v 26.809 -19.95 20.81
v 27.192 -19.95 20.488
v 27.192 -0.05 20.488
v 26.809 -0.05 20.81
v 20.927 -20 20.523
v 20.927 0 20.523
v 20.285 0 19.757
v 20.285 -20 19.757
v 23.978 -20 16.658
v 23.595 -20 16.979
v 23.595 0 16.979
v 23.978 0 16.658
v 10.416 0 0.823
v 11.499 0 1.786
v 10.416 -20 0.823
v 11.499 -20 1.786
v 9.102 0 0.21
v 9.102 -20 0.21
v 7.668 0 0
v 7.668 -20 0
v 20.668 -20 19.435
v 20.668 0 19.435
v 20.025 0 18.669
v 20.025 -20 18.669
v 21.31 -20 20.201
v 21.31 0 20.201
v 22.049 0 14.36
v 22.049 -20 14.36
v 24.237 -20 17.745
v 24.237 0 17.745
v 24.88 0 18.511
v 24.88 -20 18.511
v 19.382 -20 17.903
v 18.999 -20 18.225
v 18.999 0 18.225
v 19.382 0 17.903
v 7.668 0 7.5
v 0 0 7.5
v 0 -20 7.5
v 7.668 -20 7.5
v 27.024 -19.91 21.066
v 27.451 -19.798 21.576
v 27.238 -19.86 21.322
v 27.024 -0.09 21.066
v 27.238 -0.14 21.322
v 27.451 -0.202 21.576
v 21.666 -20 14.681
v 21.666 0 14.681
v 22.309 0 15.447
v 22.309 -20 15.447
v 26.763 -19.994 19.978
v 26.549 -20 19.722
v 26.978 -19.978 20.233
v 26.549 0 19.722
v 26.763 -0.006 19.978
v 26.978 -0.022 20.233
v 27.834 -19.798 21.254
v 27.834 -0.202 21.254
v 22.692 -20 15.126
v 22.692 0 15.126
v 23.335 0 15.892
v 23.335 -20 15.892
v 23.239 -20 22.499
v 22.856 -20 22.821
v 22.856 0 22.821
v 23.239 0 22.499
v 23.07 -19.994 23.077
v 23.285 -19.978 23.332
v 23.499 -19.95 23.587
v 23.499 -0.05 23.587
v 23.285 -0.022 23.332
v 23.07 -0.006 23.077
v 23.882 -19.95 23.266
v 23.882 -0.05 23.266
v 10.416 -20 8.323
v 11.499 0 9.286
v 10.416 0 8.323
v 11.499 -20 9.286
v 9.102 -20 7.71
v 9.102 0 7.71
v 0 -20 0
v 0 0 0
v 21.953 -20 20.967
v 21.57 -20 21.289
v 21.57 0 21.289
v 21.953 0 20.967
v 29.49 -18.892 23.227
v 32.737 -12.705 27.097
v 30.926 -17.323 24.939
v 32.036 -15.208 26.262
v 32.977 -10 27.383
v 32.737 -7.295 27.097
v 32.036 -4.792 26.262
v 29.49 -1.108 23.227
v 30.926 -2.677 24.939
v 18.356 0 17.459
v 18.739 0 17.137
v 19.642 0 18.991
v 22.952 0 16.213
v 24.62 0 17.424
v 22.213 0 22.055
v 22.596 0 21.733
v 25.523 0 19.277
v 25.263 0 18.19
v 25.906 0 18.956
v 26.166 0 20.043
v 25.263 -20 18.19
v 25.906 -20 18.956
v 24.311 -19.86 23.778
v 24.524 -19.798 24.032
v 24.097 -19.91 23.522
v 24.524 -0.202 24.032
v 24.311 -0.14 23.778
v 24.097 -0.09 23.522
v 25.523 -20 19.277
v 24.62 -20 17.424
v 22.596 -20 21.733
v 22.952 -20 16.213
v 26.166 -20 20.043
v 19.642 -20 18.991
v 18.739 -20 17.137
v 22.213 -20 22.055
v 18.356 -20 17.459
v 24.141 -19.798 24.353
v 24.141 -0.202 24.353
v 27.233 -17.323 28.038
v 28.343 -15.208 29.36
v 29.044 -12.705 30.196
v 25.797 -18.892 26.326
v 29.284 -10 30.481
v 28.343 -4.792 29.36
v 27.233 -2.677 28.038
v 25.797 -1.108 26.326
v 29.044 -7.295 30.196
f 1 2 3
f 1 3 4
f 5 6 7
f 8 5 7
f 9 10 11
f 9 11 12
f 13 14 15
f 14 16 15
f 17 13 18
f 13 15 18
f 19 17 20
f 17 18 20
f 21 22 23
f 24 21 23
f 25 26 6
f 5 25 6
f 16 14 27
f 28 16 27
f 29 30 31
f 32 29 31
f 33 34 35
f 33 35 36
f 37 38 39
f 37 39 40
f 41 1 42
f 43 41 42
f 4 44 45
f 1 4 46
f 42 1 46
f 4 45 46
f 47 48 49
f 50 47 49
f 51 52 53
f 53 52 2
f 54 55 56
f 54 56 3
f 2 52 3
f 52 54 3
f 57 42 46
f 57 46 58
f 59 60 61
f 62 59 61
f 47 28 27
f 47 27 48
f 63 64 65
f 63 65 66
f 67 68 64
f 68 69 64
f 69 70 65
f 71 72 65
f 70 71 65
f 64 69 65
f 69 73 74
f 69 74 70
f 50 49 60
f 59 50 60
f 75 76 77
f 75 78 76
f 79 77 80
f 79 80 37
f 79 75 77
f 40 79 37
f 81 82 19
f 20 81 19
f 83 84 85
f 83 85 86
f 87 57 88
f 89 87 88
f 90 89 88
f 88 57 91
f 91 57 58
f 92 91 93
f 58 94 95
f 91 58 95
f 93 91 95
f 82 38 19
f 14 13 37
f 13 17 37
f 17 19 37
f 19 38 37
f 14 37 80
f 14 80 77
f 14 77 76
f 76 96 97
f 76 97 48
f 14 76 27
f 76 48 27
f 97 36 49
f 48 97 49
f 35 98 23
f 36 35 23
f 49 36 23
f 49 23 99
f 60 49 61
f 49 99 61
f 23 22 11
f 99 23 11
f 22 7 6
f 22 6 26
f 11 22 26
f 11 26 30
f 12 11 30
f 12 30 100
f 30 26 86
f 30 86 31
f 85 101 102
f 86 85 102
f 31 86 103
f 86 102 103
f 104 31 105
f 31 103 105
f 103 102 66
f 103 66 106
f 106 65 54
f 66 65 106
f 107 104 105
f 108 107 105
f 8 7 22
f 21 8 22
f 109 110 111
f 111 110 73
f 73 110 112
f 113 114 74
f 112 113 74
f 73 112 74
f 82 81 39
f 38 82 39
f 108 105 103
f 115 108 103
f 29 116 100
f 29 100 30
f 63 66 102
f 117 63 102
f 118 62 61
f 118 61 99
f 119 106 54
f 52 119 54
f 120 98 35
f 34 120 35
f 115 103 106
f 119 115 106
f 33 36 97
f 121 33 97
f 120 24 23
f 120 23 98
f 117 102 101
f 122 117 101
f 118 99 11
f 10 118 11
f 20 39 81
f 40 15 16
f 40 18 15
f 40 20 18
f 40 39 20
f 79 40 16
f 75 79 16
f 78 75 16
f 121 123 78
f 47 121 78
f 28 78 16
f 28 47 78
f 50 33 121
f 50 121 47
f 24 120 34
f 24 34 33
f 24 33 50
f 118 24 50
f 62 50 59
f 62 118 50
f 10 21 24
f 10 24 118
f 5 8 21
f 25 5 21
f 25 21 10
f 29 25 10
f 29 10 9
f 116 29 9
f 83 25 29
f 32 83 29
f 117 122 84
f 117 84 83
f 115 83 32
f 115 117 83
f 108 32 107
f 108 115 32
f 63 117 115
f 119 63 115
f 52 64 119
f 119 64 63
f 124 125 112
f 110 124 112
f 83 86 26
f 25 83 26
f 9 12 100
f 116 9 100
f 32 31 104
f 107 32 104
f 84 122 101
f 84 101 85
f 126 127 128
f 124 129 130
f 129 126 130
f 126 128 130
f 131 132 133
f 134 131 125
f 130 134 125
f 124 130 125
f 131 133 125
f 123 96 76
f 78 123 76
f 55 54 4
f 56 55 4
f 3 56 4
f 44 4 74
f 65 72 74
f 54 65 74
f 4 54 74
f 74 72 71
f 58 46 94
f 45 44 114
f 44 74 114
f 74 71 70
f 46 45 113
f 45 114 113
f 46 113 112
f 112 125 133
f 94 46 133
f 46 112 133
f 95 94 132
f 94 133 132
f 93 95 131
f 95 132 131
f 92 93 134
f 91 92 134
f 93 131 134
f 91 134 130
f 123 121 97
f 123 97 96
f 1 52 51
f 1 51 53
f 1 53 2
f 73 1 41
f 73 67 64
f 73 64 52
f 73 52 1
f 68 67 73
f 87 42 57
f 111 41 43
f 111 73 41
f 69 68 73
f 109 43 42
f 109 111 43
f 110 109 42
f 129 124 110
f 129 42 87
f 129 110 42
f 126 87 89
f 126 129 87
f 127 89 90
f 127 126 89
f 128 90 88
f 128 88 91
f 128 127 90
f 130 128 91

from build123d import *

# Parameters (mm, degrees)
F0_W     = 10
F0_H     = 7.5
F1_DEPTH = 20
F2_R     = 5
F3_R     = 9.99999
F4_R     = 5


# Not quite as in the source:
# - a fillet or chamfer is up to 0.001 mm smaller than in the source, because OpenCascade refuses the exact size


with BuildPart() as f1:
    # F0 (on Front) → F1 (new body)
    with BuildSketch(Plane.XZ):
        with Locations((5, 3.75)):
            Rectangle(F0_W, F0_H)
        Polygon((10, 7.5), (10, 0), (22.0492679997, 14.3597584268), (21.6662457782, 14.6811522316), (22.3090333878, 15.4471966748), (22.6920556094, 15.1258028699), (23.3348432191, 15.891847313), (22.9518209975, 16.2132411179), (23.5946086072, 16.979285561), (23.9776308288, 16.6578917562), (24.6204184385, 17.4239361993), (24.2373962169, 17.7453300041), (24.8801838266, 18.5113744472), (25.2632060482, 18.1899806424), (25.9059936578, 18.9560250855), (25.5229714363, 19.2774188904), (26.165759046, 20.0434633335), (26.5487812675, 19.7220695286), (27.1915688772, 20.4881139717), (26.8085466557, 20.8095077766), (27.4513342653, 21.5755522197), (27.8343564869, 21.2541584149), (32.9766573644, 27.3825139598), (29.2836282906, 30.4813332936), (24.1413274131, 24.3529777486), (24.5243496347, 24.0315839438), (23.881562025, 23.2655395007), (23.4985398034, 23.5869333055), (22.8557521937, 22.8208888624), (23.2387744153, 22.4994950575), (22.5959868056, 21.7334506144), (22.212964584, 22.0548444193), (21.5701769744, 21.2887999761), (21.9531991959, 20.9674061713), (21.3104115862, 20.2013617282), (20.9273893647, 20.522755533), (20.284601755, 19.7567110899), (20.6676239765, 19.4353172851), (20.0248363669, 18.6692728419), (19.6418141453, 18.9906666468), (18.9990265356, 18.2246222037), (19.3820487572, 17.9032283988), (18.7392611475, 17.1371839557), (18.3562389259, 17.4585777605), align=None)
    extrude(amount=F1_DEPTH)

    # F2
    f2_edges = [f1.edges().sort_by_distance(p)[0] for p in [
        (10, -10, 7.5),
    ]]
    fillet(f2_edges, radius=F2_R)

    # F3 (radius 10 in the source; OpenCascade refuses exactly that, so slightly less here)
    f3_edges = [f1.edges().sort_by_distance(p)[0] for p in [
        (31.130143, -20, 28.931924),
        (31.130143, 0, 28.931924),
    ]]
    fillet(f3_edges, radius=F3_R)

    # F4
    f4_edges = [f1.edges().sort_by_distance(p)[0] for p in [
        (10, -10, 0),
    ]]
    fillet(f4_edges, radius=F4_R)


solid = f1.part
